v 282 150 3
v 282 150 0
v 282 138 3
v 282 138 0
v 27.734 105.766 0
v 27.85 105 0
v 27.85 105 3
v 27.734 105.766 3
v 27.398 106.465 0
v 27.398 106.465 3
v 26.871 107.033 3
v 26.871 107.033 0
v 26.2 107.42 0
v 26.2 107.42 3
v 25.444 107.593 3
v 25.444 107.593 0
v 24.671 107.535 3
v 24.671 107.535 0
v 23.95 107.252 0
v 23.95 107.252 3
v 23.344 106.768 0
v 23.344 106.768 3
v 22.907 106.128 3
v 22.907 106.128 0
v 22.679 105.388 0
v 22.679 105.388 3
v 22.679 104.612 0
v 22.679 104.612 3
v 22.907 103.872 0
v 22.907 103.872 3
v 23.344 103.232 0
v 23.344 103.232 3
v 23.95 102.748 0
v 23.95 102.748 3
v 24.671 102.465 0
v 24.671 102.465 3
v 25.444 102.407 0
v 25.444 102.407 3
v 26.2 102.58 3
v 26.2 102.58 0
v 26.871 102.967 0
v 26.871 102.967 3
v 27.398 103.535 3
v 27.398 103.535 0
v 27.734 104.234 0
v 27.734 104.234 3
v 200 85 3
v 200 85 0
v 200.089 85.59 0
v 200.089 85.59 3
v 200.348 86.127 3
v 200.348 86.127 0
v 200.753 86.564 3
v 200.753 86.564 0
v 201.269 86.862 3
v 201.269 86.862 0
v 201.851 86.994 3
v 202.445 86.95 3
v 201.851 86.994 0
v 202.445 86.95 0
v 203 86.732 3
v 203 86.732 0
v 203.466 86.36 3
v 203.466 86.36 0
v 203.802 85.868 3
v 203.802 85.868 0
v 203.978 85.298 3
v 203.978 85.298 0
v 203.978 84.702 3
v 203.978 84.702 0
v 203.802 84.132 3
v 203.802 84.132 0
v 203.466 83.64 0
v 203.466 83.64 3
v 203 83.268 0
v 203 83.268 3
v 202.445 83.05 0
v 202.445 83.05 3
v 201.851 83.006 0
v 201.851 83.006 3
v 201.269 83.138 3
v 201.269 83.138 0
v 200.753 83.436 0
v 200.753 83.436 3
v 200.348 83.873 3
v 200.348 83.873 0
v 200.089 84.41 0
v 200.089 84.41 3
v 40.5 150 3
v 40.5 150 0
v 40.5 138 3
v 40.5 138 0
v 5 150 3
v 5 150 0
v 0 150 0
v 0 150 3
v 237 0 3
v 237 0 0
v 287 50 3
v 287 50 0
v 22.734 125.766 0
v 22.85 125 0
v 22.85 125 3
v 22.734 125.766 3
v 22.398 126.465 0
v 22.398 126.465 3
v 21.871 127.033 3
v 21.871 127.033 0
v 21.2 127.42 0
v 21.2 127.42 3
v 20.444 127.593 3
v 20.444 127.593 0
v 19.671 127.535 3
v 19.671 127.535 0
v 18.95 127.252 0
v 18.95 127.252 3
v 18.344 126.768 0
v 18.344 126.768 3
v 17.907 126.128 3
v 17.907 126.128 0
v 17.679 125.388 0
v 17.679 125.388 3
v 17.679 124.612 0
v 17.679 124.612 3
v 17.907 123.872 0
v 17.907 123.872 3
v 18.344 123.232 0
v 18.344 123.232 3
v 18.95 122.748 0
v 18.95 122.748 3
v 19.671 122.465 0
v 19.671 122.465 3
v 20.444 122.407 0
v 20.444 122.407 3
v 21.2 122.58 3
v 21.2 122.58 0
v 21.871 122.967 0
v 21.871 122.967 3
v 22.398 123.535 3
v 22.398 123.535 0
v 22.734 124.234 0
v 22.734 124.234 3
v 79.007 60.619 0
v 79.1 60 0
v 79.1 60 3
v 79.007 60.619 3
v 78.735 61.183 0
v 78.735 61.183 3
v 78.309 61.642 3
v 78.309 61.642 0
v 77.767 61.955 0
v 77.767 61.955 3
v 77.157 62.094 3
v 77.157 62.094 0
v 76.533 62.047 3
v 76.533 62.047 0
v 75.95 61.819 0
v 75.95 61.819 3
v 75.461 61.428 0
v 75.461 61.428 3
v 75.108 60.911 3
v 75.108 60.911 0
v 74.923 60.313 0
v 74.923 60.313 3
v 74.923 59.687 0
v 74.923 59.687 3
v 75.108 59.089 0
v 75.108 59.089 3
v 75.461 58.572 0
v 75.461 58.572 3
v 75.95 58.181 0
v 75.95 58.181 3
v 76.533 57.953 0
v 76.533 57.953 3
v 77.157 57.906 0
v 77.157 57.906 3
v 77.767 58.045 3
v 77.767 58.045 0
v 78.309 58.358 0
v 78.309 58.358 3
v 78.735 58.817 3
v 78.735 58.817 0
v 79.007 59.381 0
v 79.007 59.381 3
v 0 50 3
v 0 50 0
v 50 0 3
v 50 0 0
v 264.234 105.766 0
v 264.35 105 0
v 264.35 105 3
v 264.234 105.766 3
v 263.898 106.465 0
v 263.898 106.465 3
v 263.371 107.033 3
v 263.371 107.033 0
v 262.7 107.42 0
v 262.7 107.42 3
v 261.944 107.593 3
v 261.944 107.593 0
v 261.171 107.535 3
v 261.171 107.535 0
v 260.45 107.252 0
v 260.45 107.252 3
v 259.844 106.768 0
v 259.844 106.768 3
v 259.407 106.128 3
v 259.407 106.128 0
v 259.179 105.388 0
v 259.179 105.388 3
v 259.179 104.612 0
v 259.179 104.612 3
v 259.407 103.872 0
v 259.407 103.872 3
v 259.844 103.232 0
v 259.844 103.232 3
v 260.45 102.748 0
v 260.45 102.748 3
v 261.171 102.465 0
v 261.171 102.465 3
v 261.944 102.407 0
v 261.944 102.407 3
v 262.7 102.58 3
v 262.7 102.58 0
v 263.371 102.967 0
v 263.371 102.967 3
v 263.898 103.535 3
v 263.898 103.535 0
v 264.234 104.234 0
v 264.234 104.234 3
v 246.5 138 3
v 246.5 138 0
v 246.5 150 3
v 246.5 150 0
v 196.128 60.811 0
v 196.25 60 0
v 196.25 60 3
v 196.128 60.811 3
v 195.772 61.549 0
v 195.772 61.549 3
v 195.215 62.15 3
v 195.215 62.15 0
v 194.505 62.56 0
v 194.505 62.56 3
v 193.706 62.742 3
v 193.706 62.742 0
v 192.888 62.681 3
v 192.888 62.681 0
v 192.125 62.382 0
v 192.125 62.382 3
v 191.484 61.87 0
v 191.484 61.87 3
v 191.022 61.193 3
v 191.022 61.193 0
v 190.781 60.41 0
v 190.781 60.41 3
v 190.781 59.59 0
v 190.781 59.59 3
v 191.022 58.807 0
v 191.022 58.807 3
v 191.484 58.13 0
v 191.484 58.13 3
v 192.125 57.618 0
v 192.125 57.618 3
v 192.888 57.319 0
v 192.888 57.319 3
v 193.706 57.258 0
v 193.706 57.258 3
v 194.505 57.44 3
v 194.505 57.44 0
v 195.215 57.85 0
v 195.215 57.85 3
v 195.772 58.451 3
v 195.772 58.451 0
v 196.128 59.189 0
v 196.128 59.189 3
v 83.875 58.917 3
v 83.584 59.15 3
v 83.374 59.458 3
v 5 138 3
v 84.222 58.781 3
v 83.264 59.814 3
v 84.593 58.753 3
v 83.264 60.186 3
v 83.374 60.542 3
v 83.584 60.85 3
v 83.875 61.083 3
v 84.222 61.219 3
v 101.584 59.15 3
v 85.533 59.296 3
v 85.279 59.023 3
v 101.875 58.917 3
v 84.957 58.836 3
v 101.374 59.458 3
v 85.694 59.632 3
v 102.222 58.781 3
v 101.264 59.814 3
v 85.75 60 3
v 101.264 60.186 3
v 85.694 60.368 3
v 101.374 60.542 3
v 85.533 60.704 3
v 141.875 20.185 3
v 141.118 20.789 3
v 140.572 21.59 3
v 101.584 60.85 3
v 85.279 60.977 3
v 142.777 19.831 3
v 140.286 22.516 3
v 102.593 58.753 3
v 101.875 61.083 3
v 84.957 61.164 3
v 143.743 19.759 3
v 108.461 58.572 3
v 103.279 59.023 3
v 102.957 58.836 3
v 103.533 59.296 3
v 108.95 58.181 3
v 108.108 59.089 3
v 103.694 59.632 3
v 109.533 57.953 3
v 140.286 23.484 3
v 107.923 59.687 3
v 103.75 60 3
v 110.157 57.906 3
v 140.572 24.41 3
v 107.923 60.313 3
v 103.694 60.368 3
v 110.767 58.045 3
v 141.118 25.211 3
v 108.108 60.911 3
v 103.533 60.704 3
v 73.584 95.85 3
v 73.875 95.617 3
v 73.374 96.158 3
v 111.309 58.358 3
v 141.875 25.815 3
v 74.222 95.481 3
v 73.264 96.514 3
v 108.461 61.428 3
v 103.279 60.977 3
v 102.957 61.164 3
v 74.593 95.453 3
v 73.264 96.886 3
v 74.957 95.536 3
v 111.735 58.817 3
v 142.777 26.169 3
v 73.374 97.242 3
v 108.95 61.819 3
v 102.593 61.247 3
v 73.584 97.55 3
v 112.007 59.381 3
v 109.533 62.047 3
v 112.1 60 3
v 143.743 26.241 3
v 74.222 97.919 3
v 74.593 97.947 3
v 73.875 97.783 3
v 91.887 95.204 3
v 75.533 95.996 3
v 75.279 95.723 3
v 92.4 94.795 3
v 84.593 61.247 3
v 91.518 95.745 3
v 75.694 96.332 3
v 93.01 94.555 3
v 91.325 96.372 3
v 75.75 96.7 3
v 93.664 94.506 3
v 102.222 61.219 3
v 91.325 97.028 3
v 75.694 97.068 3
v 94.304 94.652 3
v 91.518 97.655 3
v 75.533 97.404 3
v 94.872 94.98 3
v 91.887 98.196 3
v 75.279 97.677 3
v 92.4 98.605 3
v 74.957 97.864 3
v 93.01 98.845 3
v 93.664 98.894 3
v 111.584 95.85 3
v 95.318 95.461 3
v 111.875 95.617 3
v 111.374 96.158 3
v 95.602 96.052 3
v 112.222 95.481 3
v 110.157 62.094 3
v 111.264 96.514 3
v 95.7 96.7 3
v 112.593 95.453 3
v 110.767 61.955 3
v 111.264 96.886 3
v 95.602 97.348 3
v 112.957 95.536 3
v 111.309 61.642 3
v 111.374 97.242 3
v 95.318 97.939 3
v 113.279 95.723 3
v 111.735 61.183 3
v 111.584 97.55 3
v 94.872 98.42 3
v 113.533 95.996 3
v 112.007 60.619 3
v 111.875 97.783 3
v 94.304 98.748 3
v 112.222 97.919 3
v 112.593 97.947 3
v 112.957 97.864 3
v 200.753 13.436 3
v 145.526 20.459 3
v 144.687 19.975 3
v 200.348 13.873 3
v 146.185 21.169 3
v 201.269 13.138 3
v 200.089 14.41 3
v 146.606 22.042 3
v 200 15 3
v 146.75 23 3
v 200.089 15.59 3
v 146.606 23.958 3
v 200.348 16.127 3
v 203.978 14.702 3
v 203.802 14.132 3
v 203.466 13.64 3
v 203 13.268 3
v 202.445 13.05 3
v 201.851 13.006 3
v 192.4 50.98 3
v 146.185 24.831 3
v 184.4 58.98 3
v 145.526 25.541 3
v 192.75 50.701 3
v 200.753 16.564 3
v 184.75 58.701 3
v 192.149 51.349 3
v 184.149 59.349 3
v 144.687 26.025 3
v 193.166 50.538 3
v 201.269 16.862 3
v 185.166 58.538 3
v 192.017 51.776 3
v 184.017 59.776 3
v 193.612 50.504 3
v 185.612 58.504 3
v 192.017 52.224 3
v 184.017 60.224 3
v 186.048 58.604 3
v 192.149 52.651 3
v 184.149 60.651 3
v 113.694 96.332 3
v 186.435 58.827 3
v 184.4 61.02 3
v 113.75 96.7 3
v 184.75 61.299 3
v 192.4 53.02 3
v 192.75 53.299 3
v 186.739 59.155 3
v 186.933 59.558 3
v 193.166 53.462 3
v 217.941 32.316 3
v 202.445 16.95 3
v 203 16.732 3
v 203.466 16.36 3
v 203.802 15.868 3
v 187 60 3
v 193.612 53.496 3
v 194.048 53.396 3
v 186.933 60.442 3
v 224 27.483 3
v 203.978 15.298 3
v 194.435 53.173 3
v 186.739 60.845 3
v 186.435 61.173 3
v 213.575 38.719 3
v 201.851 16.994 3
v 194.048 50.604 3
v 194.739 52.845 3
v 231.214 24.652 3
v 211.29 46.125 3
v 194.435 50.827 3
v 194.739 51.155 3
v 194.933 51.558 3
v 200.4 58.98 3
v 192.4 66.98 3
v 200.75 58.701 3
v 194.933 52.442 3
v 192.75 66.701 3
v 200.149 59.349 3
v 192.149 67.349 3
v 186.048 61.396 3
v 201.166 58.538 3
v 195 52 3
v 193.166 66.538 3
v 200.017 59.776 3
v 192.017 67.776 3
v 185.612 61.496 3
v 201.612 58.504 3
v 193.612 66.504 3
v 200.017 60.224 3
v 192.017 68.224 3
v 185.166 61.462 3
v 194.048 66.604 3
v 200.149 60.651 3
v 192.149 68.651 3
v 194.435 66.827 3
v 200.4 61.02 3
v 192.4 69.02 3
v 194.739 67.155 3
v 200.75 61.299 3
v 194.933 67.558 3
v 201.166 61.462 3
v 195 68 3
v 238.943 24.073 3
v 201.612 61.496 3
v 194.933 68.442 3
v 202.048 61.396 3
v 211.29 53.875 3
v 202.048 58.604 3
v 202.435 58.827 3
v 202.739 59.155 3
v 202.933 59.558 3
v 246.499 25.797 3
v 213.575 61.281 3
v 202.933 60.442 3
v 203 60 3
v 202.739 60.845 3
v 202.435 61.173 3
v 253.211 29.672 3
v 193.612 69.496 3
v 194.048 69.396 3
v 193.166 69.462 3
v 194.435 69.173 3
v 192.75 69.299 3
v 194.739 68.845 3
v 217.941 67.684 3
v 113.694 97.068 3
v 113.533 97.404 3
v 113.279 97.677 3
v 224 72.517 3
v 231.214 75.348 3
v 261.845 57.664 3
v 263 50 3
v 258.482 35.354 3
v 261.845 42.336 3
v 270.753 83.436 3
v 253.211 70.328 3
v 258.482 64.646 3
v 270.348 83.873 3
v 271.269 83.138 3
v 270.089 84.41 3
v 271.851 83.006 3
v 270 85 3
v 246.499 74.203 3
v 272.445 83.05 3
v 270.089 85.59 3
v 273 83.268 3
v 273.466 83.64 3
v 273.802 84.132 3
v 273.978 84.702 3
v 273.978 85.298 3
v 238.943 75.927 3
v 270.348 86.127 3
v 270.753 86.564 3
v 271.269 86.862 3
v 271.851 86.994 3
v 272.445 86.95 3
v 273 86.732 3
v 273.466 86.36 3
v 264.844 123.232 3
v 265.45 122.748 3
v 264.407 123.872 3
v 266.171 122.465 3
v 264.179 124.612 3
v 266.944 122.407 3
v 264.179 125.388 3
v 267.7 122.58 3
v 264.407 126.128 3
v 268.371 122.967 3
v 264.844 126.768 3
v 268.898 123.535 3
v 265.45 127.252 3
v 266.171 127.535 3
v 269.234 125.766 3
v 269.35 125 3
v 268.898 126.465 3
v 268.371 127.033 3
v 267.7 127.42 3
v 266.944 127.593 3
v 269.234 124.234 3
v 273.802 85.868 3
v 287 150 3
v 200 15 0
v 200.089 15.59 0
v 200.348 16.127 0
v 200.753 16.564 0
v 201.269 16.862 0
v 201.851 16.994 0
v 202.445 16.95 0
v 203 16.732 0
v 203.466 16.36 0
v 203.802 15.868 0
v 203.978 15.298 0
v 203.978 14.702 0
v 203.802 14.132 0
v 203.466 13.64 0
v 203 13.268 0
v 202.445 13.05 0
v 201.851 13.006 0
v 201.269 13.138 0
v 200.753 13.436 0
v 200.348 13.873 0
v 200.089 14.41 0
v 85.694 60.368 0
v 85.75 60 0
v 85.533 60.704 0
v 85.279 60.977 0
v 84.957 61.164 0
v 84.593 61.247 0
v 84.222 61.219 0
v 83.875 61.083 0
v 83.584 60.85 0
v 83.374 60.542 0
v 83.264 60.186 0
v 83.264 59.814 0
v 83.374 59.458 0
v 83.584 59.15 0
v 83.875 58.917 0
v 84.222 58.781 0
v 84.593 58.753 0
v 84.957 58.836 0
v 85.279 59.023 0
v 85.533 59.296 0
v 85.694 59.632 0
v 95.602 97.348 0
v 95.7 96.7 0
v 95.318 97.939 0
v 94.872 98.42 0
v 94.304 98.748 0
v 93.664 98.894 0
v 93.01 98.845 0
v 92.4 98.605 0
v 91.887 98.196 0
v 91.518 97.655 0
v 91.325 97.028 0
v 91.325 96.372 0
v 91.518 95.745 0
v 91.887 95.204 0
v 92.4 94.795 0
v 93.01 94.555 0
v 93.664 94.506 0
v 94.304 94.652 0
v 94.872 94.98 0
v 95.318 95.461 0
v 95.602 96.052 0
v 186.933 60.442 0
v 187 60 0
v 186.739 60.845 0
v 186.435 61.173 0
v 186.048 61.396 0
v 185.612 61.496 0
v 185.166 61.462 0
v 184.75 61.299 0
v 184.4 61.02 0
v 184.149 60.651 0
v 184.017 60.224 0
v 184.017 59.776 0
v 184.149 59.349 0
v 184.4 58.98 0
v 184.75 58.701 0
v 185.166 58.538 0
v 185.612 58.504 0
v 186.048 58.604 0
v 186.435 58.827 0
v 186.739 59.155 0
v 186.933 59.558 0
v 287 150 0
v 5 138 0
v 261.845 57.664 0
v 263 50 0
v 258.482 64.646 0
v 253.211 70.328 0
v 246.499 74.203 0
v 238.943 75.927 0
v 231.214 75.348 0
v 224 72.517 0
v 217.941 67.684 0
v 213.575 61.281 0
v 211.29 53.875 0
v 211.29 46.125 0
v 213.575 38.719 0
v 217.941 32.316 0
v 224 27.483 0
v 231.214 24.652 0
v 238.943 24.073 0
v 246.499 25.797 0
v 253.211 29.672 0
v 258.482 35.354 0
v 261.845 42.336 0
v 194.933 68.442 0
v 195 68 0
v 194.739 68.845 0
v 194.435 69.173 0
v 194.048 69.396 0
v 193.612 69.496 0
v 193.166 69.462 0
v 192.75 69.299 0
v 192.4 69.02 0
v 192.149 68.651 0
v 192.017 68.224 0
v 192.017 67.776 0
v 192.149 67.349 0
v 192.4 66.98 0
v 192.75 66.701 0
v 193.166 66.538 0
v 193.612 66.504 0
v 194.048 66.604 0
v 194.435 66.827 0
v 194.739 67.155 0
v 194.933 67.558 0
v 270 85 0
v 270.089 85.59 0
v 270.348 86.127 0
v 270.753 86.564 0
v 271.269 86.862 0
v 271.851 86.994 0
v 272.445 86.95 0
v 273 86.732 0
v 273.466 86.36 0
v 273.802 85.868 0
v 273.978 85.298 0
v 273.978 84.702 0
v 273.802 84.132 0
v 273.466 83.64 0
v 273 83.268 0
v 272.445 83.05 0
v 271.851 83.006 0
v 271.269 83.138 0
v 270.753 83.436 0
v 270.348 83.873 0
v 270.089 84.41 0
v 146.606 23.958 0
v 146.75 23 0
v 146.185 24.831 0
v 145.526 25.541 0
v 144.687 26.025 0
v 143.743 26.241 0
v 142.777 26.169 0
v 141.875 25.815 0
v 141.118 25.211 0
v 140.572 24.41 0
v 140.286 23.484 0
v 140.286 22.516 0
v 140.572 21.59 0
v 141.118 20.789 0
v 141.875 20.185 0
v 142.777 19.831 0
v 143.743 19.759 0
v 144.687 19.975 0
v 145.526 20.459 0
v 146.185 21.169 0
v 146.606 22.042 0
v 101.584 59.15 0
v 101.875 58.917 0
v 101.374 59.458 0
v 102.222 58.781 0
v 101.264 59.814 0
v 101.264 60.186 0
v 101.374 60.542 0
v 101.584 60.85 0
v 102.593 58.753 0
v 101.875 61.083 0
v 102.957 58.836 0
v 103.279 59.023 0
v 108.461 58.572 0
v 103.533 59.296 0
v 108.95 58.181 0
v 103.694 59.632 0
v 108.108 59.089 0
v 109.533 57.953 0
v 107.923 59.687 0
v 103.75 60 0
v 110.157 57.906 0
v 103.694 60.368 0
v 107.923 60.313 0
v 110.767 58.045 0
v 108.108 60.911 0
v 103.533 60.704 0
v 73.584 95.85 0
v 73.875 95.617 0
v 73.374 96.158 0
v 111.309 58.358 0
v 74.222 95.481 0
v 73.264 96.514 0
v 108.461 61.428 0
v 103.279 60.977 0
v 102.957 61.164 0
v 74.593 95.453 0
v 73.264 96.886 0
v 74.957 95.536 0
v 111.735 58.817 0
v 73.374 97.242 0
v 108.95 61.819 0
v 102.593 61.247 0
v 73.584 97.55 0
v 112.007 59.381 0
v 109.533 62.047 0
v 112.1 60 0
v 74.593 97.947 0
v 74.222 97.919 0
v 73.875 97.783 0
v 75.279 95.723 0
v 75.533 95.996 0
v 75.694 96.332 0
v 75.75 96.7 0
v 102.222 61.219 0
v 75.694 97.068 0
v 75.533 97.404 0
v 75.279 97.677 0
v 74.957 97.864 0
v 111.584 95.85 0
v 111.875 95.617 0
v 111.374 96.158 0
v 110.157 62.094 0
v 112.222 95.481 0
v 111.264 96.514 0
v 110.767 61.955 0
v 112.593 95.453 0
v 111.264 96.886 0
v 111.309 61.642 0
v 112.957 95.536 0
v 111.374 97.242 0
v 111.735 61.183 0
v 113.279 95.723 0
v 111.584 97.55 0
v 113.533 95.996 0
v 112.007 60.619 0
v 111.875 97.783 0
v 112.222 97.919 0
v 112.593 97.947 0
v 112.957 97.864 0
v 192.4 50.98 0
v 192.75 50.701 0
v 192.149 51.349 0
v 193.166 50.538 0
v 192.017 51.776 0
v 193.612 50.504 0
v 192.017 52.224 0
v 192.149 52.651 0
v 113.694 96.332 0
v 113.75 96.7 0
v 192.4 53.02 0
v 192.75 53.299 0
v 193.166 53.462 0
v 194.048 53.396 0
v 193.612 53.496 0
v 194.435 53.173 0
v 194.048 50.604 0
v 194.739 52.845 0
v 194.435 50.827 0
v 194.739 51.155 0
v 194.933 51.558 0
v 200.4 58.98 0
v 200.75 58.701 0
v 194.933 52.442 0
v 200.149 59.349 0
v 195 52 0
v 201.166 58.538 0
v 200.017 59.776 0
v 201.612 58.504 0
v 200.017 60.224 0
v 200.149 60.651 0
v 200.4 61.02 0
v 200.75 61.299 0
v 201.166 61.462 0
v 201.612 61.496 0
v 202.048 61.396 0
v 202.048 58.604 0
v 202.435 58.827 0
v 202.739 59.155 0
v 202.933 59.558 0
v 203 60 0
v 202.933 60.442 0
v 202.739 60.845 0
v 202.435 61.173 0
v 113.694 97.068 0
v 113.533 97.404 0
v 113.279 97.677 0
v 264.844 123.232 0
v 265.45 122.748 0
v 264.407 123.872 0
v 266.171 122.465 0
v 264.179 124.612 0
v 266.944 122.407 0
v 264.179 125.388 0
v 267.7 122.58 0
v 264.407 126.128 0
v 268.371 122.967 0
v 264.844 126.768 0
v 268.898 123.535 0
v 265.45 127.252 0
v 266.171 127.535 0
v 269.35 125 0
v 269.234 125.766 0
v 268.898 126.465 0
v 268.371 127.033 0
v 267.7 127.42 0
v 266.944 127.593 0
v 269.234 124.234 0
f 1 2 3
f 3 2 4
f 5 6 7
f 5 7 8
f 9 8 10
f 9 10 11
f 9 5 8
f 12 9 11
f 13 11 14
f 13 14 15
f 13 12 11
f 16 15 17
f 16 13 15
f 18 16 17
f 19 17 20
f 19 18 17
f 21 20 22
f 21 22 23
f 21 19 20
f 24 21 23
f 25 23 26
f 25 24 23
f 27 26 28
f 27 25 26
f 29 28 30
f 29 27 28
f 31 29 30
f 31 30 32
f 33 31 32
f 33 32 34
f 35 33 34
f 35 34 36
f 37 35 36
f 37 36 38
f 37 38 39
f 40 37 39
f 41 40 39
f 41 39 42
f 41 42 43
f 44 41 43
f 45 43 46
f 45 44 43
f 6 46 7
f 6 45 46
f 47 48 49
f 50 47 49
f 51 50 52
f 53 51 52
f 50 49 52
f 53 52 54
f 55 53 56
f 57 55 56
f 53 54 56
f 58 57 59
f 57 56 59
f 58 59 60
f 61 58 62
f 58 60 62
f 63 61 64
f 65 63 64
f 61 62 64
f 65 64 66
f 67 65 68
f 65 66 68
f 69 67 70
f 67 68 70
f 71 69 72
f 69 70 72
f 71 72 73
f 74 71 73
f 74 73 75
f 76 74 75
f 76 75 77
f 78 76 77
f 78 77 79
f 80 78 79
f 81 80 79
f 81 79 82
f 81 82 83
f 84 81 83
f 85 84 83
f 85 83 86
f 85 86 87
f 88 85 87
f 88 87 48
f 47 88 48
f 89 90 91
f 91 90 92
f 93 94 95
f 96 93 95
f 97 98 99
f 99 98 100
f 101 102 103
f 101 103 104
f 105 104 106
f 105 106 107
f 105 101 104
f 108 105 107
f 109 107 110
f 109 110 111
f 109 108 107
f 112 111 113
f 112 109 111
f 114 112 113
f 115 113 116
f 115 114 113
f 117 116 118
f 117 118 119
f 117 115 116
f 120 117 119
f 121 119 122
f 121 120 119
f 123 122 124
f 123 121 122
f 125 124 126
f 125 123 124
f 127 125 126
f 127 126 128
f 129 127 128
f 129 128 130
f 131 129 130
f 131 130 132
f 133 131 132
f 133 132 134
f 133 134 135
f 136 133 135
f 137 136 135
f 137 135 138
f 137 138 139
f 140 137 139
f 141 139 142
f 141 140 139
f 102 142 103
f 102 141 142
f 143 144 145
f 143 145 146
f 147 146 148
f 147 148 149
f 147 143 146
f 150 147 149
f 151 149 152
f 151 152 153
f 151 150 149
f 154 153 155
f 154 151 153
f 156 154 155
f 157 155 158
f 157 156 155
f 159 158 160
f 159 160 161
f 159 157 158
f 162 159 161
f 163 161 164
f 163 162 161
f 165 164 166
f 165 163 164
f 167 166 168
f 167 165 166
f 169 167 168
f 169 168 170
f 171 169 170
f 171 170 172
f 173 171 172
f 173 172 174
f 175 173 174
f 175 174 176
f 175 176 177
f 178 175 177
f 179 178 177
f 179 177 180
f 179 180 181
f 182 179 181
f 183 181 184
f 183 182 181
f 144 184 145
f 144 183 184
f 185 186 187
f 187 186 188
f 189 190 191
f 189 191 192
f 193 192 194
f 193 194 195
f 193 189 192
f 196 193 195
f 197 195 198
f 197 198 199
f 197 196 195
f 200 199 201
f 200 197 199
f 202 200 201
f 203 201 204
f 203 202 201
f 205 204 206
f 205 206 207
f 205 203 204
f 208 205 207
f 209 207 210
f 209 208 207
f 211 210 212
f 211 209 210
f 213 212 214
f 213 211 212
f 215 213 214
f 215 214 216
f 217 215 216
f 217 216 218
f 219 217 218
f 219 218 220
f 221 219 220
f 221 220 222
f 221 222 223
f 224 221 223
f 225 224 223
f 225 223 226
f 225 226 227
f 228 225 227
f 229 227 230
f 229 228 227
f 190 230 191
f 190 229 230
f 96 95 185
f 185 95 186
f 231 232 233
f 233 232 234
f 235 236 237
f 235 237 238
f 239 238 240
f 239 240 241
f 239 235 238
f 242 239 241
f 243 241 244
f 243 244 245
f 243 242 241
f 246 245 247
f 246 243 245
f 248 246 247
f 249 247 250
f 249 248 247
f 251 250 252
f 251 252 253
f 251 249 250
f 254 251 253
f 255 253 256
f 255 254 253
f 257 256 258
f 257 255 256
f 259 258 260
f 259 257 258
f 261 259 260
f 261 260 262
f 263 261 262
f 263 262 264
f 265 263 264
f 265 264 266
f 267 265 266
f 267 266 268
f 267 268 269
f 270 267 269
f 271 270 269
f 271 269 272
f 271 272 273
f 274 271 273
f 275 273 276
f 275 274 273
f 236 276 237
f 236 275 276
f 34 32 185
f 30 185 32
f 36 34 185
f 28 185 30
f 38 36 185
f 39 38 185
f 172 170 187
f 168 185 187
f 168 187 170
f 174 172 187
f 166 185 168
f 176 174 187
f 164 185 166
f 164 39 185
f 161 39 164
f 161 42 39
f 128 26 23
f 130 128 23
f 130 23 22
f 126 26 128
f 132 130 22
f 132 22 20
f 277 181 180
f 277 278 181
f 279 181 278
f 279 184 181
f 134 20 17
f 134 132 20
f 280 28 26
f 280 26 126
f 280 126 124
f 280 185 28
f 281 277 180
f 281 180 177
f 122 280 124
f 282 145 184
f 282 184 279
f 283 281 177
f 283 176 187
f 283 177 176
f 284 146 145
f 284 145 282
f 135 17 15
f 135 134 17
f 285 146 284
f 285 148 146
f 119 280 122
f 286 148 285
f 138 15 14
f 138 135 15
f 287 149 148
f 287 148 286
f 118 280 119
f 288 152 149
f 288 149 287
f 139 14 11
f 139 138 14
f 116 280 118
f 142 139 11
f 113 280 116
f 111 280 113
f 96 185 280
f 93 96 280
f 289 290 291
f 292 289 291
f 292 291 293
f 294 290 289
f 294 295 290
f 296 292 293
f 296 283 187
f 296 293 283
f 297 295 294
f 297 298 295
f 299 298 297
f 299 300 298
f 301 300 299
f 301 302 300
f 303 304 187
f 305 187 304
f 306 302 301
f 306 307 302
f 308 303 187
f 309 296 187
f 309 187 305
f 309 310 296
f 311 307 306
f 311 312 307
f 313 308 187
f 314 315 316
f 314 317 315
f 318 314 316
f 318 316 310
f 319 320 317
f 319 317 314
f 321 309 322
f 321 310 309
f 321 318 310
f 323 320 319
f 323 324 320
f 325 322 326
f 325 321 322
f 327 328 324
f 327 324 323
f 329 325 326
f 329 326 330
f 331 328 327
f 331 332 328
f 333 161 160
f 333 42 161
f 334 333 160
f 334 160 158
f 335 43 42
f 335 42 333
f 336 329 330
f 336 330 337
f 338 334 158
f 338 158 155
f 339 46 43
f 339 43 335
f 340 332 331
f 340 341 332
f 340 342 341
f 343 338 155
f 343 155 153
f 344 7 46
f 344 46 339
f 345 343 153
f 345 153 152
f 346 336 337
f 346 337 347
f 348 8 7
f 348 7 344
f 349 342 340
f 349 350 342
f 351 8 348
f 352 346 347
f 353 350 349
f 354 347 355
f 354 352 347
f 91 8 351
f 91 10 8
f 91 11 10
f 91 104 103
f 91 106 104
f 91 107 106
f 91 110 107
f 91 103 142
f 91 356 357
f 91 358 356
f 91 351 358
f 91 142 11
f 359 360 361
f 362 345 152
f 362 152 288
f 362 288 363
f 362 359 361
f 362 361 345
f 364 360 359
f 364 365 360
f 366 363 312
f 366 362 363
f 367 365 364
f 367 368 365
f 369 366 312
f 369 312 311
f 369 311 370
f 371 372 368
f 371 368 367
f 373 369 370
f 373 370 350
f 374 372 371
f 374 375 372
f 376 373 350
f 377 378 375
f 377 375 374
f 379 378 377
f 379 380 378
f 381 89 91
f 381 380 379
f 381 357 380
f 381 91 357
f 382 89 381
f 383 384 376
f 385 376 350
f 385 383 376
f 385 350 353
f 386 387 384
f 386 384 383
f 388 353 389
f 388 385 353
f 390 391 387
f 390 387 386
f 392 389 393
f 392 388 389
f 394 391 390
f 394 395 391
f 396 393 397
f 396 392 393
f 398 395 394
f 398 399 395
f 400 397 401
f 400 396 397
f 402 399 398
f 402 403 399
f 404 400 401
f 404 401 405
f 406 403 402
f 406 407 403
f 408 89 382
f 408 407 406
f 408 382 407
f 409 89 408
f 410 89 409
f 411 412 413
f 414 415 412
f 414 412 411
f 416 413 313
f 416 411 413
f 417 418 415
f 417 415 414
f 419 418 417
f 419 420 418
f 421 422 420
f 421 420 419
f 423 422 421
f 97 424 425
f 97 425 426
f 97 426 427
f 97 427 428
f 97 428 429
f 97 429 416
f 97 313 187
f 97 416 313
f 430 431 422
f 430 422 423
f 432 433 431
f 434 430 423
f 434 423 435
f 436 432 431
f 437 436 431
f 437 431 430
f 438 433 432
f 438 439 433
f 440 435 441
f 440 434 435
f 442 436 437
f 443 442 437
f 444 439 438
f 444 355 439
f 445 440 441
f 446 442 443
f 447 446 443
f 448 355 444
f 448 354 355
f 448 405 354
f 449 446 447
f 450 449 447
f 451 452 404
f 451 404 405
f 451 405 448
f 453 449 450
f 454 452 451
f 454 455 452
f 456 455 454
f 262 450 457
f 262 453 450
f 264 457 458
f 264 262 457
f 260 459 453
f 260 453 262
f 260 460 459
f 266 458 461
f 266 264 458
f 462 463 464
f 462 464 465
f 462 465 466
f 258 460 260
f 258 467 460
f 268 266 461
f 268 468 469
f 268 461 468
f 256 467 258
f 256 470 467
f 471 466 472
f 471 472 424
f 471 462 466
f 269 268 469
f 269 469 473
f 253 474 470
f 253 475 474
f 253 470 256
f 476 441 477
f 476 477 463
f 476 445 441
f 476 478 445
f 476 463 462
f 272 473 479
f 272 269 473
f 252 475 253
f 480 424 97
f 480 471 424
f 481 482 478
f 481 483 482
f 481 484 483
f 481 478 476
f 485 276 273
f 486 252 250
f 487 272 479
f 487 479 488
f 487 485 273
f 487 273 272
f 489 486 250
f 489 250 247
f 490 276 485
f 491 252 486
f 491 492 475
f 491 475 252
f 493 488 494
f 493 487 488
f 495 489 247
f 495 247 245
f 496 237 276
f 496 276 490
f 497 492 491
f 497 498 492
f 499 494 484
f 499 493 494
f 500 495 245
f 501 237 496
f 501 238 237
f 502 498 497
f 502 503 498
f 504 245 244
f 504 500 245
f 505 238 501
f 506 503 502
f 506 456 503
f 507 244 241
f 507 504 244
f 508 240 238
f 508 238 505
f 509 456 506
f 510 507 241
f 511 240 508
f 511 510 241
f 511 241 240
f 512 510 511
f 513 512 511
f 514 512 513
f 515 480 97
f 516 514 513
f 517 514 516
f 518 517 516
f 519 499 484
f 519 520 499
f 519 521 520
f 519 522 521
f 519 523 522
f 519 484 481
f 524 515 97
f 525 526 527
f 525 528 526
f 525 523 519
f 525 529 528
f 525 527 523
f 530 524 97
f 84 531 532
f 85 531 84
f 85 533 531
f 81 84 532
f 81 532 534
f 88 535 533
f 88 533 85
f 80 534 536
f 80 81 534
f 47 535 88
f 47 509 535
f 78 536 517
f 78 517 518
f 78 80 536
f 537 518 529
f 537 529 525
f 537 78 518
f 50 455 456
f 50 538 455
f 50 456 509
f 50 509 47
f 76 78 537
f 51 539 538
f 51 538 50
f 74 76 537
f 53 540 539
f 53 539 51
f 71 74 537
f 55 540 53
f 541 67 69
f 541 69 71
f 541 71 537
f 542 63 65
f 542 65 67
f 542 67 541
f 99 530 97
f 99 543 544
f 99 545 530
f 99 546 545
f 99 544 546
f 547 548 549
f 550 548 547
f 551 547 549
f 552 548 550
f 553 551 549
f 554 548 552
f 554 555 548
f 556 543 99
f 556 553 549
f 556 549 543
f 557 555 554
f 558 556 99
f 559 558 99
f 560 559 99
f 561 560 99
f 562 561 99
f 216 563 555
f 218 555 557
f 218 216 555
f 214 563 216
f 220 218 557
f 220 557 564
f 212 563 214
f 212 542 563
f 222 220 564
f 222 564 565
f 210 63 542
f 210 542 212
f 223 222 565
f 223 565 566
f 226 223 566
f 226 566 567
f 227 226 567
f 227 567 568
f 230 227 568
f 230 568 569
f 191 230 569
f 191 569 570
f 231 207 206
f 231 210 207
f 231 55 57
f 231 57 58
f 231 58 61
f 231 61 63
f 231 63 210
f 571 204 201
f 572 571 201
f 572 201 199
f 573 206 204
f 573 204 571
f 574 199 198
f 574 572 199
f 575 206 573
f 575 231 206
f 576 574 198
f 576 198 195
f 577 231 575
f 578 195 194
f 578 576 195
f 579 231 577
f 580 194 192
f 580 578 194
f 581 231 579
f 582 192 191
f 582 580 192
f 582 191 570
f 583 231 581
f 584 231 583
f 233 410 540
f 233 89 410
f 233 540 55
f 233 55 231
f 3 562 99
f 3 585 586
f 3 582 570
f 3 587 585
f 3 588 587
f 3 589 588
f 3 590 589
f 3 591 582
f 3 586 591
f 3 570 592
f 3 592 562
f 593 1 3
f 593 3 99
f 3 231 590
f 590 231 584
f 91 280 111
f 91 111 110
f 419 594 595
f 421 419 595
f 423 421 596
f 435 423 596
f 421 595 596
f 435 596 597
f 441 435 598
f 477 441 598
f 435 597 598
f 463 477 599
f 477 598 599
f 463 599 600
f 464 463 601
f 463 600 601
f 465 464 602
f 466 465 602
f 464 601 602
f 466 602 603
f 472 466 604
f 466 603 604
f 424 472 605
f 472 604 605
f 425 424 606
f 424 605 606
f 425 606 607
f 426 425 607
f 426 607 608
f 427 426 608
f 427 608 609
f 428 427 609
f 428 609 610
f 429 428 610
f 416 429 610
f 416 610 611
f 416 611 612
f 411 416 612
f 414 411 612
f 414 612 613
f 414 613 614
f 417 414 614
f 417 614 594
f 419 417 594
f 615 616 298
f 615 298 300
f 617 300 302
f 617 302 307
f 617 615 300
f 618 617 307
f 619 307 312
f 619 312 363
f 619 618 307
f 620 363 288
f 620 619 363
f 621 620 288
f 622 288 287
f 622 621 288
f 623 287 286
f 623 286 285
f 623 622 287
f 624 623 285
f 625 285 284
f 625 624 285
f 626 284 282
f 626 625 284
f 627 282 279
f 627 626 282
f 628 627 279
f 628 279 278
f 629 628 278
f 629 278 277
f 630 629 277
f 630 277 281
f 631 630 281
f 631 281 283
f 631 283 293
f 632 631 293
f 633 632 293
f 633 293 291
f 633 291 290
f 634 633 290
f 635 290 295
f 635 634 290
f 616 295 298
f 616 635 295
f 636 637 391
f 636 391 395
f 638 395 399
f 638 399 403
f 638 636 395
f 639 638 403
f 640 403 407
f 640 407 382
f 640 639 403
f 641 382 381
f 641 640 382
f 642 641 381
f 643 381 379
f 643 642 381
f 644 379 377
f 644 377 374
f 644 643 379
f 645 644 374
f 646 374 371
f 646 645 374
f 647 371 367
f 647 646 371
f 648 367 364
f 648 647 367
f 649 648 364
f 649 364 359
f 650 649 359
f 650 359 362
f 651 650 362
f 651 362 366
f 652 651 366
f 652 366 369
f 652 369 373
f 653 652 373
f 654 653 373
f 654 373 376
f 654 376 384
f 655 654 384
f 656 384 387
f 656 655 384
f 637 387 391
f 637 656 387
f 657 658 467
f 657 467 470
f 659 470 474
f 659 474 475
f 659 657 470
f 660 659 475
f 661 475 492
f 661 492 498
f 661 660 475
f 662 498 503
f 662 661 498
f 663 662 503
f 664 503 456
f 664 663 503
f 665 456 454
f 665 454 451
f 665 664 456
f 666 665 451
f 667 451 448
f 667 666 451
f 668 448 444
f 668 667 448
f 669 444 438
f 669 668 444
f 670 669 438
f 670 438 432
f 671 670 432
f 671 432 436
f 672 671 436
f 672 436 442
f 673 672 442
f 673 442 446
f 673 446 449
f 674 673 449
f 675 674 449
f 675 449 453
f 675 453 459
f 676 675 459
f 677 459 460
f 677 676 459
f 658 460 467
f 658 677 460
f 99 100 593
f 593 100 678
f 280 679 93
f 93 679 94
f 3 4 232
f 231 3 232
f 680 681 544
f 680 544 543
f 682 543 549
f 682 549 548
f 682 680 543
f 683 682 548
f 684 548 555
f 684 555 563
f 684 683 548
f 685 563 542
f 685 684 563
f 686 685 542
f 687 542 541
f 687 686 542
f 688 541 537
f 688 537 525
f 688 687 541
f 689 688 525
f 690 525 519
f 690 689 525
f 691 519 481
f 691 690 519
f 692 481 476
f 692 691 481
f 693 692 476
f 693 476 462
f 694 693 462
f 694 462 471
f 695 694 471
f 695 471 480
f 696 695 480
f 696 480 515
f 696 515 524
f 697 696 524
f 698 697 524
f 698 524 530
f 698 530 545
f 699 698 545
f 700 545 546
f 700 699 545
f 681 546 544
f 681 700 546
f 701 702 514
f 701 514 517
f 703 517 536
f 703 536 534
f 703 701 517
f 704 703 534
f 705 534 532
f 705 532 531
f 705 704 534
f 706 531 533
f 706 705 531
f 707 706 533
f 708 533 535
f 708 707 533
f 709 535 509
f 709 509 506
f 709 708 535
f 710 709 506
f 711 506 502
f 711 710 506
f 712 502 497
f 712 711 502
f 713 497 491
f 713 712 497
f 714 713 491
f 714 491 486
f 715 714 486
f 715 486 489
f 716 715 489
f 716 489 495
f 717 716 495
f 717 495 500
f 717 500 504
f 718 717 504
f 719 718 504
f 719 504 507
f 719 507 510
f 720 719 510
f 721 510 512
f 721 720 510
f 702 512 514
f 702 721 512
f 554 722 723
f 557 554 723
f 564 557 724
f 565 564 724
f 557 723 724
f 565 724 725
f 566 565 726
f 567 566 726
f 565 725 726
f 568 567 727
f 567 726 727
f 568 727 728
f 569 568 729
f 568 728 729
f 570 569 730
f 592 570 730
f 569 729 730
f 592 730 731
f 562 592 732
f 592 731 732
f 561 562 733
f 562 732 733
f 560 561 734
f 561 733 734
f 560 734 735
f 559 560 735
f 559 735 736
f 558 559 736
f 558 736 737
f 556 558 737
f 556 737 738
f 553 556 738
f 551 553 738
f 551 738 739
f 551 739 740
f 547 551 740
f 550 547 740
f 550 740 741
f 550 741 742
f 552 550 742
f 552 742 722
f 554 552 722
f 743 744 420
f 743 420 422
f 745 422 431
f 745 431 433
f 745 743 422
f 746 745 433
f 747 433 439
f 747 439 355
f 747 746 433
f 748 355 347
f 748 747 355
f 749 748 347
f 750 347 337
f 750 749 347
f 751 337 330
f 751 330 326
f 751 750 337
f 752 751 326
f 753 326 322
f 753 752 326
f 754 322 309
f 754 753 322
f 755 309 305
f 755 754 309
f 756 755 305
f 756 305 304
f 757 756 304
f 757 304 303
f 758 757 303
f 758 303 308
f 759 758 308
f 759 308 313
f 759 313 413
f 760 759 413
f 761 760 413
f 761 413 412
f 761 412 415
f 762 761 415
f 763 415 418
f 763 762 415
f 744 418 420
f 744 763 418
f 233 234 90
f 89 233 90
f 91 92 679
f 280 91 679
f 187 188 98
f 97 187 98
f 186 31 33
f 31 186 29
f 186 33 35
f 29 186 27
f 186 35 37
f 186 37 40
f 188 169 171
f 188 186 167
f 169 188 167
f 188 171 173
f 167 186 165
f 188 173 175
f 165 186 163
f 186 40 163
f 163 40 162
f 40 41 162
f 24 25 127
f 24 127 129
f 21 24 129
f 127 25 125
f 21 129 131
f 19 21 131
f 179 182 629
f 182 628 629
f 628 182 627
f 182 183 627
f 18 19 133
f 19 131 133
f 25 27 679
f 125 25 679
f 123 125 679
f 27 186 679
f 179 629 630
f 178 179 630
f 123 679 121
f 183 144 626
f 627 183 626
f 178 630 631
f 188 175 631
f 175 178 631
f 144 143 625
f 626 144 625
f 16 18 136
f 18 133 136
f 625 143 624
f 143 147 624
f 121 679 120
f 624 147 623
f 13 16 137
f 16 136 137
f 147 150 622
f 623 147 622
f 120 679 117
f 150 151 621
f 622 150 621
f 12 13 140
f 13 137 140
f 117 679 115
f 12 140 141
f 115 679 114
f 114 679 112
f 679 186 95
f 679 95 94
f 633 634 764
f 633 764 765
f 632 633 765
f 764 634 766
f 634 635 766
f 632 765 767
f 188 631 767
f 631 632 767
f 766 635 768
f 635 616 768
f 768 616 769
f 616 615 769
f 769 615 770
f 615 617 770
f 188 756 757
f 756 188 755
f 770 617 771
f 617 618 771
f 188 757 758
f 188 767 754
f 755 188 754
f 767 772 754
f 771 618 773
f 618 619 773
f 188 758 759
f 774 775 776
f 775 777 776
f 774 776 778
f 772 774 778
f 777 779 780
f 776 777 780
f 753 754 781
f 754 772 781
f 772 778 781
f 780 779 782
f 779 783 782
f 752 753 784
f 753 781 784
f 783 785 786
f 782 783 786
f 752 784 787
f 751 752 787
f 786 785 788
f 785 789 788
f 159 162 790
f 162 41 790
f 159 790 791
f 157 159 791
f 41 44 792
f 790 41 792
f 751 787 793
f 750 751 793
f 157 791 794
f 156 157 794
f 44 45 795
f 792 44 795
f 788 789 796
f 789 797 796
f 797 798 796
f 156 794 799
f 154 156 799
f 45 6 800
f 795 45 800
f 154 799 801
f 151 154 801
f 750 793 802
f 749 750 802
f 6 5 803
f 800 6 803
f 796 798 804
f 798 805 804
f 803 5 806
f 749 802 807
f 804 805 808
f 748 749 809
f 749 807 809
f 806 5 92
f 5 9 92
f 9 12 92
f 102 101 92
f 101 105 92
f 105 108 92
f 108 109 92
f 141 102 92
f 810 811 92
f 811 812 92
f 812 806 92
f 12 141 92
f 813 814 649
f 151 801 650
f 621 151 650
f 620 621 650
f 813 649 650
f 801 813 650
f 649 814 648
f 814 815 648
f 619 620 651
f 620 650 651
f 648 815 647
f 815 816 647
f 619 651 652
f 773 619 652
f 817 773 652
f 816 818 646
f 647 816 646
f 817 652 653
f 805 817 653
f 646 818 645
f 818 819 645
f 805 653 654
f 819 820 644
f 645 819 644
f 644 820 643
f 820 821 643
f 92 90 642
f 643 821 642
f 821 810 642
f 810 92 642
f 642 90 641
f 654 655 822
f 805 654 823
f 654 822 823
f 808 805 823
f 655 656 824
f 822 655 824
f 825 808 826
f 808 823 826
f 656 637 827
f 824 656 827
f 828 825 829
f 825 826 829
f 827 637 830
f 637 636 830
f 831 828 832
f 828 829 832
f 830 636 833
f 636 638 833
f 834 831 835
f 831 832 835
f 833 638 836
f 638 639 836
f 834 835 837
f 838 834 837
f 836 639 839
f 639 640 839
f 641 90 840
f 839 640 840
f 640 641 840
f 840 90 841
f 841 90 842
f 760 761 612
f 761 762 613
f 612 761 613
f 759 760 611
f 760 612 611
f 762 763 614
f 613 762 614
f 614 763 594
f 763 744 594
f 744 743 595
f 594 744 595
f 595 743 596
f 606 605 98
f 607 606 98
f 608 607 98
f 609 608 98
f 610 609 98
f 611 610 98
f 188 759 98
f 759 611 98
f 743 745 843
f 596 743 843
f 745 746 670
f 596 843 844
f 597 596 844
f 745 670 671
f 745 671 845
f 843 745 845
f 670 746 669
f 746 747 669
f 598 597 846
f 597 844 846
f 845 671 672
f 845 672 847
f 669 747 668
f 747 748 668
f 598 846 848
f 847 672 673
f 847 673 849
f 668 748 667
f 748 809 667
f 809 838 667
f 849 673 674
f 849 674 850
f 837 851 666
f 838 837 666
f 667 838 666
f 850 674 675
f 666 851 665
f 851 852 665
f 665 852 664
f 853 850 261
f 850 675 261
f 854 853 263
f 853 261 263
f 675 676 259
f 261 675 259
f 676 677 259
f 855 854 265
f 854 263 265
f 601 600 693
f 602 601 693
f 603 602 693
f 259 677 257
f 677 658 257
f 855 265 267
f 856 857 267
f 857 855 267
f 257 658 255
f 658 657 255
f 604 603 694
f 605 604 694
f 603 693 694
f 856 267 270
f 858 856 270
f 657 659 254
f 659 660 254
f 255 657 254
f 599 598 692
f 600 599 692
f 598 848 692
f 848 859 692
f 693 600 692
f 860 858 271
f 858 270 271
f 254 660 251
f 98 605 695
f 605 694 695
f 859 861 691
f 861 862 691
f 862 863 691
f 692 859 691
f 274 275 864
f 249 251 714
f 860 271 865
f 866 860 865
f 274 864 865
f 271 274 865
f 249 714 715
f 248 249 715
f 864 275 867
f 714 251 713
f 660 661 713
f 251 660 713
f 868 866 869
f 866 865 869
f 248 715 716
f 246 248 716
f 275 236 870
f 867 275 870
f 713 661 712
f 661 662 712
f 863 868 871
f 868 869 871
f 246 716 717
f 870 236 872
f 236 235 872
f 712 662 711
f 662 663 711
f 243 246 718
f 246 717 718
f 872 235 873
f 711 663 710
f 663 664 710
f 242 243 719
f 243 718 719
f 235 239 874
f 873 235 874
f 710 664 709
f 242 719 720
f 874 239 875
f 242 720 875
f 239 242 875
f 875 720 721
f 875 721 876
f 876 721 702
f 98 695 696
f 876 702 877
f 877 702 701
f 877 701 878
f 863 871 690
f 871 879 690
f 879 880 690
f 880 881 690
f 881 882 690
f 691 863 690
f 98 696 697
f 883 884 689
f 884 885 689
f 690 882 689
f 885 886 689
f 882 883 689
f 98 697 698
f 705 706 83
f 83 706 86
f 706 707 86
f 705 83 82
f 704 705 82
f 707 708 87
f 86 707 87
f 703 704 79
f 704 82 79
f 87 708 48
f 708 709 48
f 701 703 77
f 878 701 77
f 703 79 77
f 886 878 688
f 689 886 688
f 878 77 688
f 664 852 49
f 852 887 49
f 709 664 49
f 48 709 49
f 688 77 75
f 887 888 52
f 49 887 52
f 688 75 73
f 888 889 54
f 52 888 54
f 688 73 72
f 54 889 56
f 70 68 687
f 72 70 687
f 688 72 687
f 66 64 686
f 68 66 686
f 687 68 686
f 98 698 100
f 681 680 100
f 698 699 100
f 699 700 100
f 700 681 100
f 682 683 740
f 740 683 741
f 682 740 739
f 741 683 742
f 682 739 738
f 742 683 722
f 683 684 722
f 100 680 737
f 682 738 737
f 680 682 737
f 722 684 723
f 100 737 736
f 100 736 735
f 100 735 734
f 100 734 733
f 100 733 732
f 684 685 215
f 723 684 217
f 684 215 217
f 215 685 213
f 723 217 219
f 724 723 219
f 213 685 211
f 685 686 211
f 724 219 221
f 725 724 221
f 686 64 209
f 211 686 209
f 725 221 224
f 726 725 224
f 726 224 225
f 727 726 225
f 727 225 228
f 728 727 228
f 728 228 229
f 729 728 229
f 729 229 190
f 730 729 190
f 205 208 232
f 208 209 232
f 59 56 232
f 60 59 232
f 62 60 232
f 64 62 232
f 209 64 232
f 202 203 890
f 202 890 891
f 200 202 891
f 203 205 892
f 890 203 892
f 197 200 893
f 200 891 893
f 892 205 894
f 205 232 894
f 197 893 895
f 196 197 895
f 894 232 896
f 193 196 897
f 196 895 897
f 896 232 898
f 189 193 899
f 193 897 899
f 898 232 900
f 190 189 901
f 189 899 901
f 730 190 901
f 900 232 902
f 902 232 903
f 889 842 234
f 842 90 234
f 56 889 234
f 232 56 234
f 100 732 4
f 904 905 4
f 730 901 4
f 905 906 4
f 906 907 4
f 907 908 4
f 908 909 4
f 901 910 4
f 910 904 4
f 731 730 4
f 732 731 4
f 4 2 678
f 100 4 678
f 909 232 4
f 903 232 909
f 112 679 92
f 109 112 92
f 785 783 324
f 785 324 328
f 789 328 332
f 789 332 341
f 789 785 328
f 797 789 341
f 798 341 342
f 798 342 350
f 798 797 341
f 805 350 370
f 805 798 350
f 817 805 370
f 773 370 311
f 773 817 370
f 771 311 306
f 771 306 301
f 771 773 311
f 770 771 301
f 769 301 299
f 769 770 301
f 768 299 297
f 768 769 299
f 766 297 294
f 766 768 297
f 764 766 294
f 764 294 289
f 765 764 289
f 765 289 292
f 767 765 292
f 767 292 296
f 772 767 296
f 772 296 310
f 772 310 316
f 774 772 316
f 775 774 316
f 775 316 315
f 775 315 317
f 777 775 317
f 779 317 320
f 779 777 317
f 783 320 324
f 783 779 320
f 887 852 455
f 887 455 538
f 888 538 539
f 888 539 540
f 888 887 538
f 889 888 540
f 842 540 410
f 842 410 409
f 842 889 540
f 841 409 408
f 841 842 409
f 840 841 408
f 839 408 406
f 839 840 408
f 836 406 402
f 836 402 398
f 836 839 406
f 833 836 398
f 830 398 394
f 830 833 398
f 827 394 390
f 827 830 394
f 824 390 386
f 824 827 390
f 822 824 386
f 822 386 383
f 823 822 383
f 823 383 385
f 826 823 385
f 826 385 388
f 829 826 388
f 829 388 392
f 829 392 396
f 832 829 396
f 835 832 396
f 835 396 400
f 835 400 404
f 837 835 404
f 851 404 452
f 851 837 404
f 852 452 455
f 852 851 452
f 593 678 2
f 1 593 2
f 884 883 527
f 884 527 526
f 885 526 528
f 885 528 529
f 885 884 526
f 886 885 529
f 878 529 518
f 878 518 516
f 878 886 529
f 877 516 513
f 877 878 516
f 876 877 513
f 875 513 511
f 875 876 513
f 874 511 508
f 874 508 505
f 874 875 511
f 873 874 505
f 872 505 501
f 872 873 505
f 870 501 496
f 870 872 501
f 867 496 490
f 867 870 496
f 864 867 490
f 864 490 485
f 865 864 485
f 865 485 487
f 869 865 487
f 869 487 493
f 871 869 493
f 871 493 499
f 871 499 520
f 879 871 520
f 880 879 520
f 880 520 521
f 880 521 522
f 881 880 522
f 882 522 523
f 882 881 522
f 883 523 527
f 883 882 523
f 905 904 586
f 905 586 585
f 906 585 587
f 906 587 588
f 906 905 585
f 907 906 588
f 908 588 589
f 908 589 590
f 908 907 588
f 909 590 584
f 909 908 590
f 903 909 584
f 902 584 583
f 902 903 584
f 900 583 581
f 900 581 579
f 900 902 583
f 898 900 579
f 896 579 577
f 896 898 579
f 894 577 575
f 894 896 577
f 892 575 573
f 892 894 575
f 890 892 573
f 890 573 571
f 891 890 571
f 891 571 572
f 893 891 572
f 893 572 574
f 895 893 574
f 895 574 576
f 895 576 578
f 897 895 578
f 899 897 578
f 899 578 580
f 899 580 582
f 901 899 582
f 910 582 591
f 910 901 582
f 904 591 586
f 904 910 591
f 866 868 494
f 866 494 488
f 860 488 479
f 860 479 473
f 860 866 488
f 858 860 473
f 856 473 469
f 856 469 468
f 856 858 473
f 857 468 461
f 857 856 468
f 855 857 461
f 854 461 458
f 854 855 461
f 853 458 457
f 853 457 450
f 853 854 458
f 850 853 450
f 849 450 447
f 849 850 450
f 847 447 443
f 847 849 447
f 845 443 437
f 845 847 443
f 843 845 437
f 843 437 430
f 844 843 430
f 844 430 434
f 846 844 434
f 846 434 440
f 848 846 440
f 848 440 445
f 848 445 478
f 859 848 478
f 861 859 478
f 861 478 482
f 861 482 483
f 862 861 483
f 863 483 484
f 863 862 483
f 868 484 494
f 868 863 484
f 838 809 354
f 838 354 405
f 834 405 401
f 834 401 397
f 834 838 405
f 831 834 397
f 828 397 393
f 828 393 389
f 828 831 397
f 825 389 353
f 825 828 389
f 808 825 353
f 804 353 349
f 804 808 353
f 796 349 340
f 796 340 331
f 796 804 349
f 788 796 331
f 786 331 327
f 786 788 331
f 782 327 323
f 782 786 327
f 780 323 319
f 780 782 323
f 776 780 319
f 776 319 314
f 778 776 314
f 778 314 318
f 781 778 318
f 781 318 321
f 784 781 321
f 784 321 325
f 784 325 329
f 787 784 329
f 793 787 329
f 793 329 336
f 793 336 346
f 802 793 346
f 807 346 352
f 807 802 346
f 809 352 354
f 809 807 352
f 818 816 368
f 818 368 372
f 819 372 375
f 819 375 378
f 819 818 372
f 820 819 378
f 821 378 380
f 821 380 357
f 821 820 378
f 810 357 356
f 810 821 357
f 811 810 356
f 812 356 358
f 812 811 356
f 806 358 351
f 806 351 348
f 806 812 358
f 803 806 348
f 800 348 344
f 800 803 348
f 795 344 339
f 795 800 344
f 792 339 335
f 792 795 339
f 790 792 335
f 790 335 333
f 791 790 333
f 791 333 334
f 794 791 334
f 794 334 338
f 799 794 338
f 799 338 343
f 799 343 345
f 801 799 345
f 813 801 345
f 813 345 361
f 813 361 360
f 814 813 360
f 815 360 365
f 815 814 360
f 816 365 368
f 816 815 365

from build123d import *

# Parameters (mm, degrees)
MODEL_R             = 2.6
MODEL_R_2           = 1.25
MODEL_R_3           = 2.2
MODEL_R_4           = 2.1
MODEL_R_5           = 2.75
MODEL_R_6           = 1.5
MODEL_R_7           = 3.25
MODEL_R_8           = 26
BOSS_EXTRUDE1_DEPTH = 3
SKETCH1_R           = 2
CUT_EXTRUDE1_DEPTH  = 4


with BuildPart() as part:
    # Model → Boss-Extrude1 (new body)
    with BuildSketch(Plane.XY):
        Polygon((5, 150), (0, 150), (0, 50), (50, 0), (237, 0), (287, 50), (287, 150), (282, 150), (282, 138), (246.5, 138), (246.5, 150), (40.5, 150), (40.5, 138), (5, 138), align=None)
        with Locations((266.75, 125)):
            Circle(MODEL_R, mode=Mode.SUBTRACT)
        with Locations((261.75, 105)):
            Circle(MODEL_R, mode=Mode.SUBTRACT)
        with Locations((25.25, 105)):
            Circle(MODEL_R, mode=Mode.SUBTRACT)
        with Locations((20.25, 125)):
            Circle(MODEL_R, mode=Mode.SUBTRACT)
        with Locations((74.5, 96.7)):
            Circle(MODEL_R_2, mode=Mode.SUBTRACT)
        with Locations((93.5, 96.7)):
            Circle(MODEL_R_3, mode=Mode.SUBTRACT)
        with Locations((110, 60)):
            Circle(MODEL_R_4, mode=Mode.SUBTRACT)
        with Locations((77, 60)):
            Circle(MODEL_R_4, mode=Mode.SUBTRACT)
        with Locations((84.5, 60)):
            Circle(MODEL_R_2, mode=Mode.SUBTRACT)
        with Locations((102.5, 60)):
            Circle(MODEL_R_2, mode=Mode.SUBTRACT)
        with Locations((112.5, 96.7)):
            Circle(MODEL_R_2, mode=Mode.SUBTRACT)
        with Locations((193.5, 60)):
            Circle(MODEL_R_5, mode=Mode.SUBTRACT)
        with Locations((201.5, 60)):
            Circle(MODEL_R_6, mode=Mode.SUBTRACT)
        with Locations((185.5, 60)):
            Circle(MODEL_R_6, mode=Mode.SUBTRACT)
        with Locations((143.5, 23)):
            Circle(MODEL_R_7, mode=Mode.SUBTRACT)
        with Locations((193.5, 68)):
            Circle(MODEL_R_6, mode=Mode.SUBTRACT)
        with Locations((193.5, 52)):
            Circle(MODEL_R_6, mode=Mode.SUBTRACT)
        with Locations((237, 50)):
            Circle(MODEL_R_8, mode=Mode.SUBTRACT)
    extrude(amount=BOSS_EXTRUDE1_DEPTH)

    # Sketch1 → Cut-Extrude1 (cut, through all)
    with BuildSketch(Plane(origin=(0, 0, 0), x_dir=(-1, 0, 0), z_dir=(0, 0, -1))):
        with Locations((-202, 85)):
            Circle(SKETCH1_R)
        with Locations((-202, 15)):
            Circle(SKETCH1_R)
        with Locations((-272, 85)):
            Circle(SKETCH1_R)
    extrude(amount=-CUT_EXTRUDE1_DEPTH, mode=Mode.SUBTRACT)


solid = part.part
